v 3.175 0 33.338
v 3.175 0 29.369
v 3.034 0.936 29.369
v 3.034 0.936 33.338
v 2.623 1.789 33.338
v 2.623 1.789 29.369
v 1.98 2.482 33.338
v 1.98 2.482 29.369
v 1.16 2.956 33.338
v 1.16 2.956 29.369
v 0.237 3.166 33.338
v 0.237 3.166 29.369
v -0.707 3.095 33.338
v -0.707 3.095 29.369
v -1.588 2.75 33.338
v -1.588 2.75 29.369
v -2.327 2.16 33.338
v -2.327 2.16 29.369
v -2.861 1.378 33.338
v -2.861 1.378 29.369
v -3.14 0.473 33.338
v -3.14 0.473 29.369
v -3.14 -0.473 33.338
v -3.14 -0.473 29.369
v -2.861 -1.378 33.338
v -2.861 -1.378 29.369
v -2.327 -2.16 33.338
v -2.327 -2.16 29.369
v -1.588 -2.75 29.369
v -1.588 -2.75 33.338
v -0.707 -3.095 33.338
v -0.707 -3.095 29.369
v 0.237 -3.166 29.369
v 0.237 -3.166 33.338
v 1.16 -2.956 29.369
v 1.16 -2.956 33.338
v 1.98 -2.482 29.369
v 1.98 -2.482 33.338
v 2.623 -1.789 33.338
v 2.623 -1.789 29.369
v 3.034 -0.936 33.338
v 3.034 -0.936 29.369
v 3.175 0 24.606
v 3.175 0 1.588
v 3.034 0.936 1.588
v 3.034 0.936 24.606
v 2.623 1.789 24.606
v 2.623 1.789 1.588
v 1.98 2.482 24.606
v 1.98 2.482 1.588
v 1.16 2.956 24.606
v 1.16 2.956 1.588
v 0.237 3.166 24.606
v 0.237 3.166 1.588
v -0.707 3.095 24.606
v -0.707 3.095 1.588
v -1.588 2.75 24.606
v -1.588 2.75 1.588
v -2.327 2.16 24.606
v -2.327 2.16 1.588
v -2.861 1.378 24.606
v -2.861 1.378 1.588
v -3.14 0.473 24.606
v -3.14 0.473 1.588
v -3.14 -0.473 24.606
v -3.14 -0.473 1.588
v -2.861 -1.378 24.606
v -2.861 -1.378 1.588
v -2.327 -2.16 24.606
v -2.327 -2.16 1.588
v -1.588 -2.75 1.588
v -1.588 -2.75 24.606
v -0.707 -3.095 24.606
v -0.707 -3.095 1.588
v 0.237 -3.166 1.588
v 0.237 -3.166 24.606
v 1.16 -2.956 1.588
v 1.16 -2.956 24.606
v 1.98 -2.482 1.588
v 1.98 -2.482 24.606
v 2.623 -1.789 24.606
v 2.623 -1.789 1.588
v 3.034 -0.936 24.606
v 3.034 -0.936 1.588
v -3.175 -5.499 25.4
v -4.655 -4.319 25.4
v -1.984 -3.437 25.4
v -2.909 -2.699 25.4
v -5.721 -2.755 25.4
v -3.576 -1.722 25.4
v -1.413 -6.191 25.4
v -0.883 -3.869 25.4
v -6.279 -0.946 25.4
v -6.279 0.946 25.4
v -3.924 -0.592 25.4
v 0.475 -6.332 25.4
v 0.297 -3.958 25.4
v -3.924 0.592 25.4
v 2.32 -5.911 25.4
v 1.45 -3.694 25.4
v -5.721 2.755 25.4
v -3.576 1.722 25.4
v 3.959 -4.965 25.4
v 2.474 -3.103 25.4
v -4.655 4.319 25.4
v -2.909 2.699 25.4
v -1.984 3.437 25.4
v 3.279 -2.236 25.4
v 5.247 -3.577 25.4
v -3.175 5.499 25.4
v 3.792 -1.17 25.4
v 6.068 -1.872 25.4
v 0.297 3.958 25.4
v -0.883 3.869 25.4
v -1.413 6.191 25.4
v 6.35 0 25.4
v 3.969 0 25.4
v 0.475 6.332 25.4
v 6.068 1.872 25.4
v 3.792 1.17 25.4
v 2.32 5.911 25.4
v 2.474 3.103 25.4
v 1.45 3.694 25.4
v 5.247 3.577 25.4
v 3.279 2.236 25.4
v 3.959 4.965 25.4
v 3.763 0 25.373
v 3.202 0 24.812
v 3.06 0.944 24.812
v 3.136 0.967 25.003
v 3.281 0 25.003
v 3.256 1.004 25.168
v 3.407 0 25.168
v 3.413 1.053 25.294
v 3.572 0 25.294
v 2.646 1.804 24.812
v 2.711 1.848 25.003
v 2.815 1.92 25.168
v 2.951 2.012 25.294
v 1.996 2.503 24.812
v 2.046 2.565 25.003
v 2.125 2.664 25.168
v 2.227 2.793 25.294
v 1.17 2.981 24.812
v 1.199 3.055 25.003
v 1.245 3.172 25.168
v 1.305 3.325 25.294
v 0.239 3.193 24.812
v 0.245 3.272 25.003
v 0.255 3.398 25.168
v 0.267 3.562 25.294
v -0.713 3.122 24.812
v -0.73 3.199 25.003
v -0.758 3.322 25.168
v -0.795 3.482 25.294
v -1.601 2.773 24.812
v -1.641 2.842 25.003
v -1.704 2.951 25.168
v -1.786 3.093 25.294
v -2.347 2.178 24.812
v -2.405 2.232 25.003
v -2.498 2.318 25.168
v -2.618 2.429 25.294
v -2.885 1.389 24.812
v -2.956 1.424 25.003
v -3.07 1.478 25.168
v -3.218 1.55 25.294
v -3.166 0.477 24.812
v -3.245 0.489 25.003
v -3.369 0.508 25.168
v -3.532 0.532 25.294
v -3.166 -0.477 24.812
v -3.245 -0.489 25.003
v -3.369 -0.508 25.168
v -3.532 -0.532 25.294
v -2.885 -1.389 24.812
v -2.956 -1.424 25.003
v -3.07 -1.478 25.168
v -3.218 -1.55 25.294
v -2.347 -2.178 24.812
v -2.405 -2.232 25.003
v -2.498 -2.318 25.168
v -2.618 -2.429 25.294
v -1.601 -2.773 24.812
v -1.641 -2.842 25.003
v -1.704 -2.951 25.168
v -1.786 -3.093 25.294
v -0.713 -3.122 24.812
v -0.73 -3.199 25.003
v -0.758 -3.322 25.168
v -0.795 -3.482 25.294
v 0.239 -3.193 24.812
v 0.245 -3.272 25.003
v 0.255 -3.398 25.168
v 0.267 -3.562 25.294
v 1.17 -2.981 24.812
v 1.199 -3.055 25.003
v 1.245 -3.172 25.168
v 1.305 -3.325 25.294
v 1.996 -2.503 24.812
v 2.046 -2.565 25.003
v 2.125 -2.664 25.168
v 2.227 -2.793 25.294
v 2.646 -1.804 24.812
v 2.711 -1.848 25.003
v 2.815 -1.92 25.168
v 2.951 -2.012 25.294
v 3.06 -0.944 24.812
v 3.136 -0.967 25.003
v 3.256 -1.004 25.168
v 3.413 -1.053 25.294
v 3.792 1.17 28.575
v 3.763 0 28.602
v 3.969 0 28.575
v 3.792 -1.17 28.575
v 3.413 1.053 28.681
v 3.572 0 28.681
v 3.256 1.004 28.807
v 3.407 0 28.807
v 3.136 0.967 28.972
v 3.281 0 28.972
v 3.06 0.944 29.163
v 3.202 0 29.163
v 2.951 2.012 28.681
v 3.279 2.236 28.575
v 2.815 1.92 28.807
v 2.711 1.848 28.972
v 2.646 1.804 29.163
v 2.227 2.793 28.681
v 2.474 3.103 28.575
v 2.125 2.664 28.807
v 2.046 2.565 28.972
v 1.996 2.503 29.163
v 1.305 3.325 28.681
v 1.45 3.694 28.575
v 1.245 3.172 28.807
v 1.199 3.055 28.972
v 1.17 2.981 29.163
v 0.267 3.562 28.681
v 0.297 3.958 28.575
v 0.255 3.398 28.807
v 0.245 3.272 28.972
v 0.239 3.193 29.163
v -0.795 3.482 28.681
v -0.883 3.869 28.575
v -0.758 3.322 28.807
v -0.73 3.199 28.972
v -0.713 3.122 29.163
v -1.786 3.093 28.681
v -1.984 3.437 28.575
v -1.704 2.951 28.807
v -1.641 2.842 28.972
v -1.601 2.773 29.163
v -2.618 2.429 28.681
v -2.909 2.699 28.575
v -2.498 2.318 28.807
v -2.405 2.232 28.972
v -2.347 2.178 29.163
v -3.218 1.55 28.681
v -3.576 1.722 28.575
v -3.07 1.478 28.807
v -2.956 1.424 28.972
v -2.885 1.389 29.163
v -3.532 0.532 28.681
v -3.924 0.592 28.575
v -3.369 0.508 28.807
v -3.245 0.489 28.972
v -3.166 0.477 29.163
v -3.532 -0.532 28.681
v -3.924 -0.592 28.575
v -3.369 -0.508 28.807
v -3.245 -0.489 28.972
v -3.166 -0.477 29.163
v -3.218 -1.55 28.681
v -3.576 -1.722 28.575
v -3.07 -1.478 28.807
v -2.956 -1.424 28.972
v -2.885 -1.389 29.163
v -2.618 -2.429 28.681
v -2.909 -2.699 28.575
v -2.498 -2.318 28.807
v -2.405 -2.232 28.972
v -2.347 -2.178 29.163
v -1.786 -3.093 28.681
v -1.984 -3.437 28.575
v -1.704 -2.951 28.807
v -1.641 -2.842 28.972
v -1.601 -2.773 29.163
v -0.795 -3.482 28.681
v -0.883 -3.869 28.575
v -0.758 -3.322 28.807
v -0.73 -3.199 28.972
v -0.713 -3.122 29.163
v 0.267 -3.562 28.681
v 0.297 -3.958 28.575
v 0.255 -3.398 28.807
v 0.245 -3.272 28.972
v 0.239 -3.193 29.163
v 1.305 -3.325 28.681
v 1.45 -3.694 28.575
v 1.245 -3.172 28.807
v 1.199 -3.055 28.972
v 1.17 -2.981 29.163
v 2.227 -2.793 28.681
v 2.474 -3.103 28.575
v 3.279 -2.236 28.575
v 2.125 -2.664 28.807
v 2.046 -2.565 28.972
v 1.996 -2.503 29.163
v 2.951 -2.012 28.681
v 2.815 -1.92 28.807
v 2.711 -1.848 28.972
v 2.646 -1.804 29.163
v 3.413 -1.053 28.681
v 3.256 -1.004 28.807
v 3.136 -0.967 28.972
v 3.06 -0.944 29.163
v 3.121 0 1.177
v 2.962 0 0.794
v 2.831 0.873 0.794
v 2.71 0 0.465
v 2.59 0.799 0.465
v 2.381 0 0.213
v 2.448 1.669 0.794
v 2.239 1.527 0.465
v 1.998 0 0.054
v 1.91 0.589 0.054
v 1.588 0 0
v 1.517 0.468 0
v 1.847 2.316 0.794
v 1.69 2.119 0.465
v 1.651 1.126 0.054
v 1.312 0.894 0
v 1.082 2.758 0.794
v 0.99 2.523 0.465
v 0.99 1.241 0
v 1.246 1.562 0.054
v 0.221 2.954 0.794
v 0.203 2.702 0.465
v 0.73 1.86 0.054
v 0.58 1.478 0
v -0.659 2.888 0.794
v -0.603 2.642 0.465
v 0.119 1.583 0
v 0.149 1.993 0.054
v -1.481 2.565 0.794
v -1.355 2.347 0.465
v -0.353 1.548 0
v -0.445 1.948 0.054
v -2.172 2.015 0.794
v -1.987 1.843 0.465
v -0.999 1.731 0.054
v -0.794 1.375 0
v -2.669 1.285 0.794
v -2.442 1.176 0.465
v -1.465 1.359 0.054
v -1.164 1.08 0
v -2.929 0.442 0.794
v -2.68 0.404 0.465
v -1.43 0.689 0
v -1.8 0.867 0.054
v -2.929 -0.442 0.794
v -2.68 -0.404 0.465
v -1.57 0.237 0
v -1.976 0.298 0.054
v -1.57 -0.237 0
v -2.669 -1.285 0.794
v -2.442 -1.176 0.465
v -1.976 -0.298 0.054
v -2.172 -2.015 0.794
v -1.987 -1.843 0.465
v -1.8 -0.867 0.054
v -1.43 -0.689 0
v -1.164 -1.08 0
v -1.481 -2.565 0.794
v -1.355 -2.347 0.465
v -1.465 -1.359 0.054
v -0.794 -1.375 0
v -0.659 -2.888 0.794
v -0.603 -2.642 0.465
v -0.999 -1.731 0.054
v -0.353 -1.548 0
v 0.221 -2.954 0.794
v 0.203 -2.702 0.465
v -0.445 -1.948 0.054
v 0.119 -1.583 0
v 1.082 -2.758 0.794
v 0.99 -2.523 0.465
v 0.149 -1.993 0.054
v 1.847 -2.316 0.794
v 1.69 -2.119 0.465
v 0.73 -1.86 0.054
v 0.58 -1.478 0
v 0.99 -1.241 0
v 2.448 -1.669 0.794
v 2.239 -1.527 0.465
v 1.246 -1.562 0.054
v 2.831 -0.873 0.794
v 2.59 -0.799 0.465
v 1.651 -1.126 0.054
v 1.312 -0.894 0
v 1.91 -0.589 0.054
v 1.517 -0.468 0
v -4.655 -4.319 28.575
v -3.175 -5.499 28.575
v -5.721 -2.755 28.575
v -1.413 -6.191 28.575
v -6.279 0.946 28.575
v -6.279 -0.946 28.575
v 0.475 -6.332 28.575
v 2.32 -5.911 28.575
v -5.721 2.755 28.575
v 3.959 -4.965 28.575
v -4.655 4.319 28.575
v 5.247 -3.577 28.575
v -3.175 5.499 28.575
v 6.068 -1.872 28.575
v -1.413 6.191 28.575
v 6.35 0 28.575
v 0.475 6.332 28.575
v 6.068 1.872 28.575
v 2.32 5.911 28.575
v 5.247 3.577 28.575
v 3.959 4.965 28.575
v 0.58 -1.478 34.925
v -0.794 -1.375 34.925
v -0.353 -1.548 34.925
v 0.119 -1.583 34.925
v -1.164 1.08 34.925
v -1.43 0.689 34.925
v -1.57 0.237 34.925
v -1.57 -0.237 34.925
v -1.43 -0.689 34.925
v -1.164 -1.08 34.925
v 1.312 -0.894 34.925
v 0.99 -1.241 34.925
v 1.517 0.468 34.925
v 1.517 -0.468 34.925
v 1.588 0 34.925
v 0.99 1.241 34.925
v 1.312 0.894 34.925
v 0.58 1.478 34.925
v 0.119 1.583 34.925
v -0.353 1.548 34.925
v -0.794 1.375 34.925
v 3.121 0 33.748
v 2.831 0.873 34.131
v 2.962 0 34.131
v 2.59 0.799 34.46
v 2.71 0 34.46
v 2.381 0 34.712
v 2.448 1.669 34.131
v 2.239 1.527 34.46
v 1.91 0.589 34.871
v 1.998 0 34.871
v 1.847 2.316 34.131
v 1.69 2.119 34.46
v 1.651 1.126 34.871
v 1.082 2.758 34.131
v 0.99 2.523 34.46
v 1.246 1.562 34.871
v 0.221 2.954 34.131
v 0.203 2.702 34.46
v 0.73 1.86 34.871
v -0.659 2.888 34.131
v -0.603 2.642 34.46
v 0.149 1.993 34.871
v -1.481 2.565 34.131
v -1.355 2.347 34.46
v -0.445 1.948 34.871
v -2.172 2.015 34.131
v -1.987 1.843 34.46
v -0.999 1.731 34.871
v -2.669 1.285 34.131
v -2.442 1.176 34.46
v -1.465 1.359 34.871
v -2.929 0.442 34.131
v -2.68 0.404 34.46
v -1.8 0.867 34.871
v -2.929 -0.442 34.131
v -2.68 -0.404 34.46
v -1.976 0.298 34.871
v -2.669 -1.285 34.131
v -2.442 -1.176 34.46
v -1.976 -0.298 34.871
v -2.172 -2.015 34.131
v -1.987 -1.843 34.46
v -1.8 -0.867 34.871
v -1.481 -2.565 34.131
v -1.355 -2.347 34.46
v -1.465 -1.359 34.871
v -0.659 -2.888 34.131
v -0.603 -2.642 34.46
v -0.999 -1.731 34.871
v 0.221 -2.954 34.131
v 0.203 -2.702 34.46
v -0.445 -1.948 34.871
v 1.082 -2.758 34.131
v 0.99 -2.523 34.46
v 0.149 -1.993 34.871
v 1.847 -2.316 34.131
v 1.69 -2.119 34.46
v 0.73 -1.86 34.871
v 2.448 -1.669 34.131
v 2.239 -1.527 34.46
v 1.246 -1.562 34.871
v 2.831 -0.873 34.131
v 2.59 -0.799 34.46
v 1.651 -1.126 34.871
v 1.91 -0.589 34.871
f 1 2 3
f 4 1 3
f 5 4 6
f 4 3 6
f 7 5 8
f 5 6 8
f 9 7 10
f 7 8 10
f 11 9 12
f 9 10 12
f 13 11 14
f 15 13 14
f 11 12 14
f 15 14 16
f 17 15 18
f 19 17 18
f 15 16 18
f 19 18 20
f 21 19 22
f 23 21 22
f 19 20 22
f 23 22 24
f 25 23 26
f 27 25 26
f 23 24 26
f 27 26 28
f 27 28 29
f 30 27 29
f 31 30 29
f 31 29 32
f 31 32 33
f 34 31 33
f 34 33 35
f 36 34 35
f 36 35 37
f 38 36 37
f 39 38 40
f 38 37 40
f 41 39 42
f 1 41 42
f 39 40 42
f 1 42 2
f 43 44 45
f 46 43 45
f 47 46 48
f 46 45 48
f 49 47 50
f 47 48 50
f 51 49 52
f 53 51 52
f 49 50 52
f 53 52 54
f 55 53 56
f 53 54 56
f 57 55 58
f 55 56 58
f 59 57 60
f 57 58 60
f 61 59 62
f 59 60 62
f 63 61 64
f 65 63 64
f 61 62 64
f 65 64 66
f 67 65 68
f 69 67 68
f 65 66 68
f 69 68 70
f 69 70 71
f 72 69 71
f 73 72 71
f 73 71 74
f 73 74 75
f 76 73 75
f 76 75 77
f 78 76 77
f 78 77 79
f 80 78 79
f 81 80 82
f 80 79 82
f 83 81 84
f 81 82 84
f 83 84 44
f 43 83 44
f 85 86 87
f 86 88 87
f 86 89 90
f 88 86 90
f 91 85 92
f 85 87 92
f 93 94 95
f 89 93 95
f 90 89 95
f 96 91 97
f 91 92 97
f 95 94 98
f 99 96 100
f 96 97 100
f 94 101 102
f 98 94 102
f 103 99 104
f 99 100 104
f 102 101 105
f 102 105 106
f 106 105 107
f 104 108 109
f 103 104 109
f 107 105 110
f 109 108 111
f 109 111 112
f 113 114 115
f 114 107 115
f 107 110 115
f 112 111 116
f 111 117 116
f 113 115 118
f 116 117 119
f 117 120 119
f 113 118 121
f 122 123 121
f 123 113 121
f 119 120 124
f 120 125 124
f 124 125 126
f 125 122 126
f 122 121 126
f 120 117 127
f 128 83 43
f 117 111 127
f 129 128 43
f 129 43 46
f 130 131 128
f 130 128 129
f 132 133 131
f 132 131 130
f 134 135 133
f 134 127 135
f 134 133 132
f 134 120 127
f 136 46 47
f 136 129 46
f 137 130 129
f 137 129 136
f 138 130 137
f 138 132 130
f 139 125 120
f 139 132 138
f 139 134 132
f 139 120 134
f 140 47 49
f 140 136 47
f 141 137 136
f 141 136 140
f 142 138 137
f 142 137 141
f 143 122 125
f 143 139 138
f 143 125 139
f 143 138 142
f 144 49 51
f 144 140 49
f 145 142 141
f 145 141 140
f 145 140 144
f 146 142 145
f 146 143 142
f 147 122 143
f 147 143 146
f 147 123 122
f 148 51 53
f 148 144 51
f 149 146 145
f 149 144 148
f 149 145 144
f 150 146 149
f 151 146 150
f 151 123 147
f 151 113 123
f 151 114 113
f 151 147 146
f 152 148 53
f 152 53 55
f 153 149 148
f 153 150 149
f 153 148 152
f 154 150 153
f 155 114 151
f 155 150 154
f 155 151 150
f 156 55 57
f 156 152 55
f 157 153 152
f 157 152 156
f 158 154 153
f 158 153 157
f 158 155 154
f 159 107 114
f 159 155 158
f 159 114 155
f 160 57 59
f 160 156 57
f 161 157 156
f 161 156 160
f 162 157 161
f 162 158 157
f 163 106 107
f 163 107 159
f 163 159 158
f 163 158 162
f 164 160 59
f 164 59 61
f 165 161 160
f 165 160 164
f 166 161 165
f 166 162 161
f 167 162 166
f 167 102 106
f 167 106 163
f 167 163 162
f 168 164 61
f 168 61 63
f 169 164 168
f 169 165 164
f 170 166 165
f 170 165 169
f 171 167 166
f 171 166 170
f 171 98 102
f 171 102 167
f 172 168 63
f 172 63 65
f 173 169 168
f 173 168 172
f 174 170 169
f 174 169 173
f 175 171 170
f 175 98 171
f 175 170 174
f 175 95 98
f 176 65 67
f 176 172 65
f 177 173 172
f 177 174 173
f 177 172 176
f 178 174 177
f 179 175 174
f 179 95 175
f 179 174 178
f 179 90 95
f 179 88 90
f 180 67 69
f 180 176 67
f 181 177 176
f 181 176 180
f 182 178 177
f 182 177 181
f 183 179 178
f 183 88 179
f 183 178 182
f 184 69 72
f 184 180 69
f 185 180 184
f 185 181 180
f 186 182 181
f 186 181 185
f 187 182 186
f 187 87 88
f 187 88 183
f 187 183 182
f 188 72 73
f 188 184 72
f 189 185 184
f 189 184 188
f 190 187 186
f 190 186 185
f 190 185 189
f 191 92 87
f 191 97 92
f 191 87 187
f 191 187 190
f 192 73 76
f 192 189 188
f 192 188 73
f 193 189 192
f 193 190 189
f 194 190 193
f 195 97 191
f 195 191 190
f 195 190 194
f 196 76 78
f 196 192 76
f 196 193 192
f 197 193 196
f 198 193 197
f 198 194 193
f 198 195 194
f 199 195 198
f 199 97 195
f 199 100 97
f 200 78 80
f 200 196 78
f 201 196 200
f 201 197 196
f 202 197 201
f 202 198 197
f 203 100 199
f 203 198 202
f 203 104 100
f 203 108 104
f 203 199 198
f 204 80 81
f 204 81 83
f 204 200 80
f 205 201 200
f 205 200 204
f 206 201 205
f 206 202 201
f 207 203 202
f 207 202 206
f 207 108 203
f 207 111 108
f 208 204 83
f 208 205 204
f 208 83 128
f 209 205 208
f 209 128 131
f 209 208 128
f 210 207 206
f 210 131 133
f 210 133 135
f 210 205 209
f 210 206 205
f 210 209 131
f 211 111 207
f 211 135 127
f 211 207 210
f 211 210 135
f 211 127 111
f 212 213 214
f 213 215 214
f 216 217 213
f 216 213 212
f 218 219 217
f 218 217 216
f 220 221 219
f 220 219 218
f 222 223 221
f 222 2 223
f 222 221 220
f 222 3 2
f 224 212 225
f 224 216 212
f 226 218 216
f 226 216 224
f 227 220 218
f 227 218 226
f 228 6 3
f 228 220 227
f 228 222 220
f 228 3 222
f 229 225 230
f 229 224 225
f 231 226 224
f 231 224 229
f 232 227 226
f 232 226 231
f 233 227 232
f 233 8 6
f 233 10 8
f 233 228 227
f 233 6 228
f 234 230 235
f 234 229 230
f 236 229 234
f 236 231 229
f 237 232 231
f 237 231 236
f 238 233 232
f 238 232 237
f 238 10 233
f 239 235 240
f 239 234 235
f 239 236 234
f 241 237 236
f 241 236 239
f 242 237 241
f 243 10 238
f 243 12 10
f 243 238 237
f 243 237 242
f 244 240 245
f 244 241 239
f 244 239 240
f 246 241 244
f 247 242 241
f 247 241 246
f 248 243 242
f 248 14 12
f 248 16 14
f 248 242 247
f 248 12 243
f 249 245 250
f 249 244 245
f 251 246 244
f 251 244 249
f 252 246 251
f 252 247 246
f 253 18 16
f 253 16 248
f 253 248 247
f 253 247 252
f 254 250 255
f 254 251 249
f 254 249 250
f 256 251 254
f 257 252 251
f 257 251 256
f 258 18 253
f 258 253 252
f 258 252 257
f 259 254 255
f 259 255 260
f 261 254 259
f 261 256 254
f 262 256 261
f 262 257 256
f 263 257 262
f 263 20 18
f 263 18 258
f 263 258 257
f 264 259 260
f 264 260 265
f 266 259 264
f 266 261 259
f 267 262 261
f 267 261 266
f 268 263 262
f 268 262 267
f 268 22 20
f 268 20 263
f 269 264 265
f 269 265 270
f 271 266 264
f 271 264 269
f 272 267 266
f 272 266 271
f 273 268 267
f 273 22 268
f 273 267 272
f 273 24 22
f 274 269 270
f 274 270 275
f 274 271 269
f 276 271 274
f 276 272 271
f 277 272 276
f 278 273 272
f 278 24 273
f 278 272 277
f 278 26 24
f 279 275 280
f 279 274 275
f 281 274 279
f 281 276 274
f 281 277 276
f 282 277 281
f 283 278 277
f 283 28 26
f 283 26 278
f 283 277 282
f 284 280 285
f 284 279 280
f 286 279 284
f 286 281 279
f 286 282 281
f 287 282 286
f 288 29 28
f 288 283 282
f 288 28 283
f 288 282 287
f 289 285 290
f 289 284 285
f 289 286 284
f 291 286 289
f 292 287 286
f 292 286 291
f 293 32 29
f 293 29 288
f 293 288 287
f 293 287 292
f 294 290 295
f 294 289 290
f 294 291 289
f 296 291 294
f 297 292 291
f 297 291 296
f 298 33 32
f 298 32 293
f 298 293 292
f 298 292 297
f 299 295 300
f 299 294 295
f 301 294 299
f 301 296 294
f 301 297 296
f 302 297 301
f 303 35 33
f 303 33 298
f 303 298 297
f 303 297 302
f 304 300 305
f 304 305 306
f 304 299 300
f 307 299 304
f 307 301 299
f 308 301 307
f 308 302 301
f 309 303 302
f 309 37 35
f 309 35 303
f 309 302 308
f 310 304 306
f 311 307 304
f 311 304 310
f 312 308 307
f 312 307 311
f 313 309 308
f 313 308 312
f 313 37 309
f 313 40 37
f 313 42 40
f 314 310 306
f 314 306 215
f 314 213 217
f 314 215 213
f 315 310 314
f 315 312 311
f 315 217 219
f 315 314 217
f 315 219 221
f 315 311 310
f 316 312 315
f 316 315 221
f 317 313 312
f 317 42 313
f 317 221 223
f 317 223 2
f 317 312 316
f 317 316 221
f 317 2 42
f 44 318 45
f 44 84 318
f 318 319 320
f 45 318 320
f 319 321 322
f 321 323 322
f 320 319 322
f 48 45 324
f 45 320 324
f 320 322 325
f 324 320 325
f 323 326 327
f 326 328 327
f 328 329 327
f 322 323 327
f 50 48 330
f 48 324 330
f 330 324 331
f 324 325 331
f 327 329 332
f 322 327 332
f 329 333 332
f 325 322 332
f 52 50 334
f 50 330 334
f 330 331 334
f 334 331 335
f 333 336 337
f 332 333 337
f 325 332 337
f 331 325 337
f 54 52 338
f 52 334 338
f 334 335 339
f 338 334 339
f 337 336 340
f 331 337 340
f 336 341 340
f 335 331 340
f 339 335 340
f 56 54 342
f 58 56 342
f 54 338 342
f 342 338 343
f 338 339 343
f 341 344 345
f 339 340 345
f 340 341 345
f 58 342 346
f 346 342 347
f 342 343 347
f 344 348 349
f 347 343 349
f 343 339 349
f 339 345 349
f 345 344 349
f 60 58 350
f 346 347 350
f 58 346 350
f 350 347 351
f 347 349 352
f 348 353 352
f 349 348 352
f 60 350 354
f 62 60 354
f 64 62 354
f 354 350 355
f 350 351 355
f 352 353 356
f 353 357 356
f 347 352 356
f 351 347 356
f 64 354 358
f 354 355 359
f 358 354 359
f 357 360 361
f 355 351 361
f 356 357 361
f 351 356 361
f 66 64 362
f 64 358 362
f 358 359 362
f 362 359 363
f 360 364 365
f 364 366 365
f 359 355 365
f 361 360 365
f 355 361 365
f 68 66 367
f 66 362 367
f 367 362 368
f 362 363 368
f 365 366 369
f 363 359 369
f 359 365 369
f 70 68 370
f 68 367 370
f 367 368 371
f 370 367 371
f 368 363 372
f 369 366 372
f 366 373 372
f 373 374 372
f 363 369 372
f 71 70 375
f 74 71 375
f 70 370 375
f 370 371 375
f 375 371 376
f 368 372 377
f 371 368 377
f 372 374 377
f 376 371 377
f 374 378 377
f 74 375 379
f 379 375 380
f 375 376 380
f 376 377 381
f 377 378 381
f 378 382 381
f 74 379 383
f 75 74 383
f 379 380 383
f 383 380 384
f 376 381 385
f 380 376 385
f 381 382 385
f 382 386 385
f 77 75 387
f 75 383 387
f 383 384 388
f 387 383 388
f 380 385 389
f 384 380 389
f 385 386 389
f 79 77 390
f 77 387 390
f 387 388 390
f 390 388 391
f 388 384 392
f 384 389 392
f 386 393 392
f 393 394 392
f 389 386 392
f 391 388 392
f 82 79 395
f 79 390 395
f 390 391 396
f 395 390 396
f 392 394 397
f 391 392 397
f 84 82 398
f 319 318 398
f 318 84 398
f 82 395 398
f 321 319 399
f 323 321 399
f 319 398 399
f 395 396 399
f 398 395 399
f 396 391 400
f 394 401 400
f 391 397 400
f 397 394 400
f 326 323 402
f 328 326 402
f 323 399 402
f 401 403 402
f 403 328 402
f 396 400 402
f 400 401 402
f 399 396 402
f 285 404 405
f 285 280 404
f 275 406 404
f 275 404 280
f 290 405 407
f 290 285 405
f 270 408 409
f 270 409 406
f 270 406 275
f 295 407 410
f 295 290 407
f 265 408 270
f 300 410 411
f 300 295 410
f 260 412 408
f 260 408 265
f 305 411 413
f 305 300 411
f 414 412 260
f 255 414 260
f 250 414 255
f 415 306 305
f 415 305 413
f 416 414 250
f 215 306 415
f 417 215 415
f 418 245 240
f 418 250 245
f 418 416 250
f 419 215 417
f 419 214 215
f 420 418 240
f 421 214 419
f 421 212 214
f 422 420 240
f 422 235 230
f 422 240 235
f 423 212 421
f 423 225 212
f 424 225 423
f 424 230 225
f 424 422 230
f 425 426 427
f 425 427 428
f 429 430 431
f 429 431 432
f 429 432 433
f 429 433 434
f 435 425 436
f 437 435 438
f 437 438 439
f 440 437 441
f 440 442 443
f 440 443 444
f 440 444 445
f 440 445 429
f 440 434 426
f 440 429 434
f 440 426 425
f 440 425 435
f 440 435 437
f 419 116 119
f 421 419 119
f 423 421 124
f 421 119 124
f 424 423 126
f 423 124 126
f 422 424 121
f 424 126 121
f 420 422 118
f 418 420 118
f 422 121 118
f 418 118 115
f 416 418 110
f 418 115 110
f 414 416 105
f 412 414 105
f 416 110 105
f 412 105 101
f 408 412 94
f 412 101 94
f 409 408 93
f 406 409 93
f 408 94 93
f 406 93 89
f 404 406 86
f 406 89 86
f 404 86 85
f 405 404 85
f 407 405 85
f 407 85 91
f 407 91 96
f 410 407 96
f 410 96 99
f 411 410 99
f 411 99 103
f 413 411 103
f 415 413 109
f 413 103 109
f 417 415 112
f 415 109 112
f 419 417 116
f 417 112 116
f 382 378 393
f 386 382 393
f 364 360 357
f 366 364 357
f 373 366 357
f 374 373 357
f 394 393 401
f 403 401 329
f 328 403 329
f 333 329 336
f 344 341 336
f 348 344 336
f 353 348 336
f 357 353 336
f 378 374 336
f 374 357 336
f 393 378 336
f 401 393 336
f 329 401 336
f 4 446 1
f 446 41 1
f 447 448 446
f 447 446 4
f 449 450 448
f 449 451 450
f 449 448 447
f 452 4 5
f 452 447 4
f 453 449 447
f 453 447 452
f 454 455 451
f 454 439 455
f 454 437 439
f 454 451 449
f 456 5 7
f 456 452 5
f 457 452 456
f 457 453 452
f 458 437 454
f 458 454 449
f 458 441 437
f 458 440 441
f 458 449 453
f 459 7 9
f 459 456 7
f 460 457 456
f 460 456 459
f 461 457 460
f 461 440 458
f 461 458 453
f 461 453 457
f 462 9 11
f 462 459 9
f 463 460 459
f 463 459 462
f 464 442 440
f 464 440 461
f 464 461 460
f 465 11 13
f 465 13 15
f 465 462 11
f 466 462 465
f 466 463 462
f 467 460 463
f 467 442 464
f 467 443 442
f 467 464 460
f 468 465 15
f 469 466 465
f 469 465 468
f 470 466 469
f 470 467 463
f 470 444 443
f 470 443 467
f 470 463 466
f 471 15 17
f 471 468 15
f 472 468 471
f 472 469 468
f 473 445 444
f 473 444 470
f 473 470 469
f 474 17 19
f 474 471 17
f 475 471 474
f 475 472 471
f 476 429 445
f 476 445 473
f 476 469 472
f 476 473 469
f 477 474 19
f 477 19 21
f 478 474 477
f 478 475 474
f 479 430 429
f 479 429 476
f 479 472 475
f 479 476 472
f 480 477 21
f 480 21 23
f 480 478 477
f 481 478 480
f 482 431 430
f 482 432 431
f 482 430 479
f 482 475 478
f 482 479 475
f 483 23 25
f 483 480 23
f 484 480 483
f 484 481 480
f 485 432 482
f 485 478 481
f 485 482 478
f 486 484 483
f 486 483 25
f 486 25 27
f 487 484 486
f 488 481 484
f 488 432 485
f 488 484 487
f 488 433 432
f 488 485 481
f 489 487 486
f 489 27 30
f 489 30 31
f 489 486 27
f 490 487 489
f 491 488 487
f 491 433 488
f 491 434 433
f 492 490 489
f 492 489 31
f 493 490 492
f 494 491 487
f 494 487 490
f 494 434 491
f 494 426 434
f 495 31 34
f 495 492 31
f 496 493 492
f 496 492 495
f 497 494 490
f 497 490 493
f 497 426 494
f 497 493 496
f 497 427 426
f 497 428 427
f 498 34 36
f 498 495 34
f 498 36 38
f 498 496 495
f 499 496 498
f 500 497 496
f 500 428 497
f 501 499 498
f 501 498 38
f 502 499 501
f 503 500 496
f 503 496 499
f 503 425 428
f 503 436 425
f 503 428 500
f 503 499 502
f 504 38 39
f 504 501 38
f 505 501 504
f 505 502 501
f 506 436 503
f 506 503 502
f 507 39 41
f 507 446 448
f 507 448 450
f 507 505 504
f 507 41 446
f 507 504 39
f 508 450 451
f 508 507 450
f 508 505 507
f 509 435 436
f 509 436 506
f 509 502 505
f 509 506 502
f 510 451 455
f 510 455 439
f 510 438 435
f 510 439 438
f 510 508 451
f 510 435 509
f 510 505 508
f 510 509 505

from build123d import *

# Parameters (mm, degrees)
SKETCH1_R           = 3.175
BOSS_EXTRUDE1_DEPTH = 25.4
SKETCH2_R           = 6.35
BOSS_EXTRUDE2_DEPTH = 3.175
SKETCH3_R           = 3.175
BOSS_EXTRUDE3_DEPTH = 6.35
FILLET1_R           = 1.5875
FILLET2_R           = 0.79375


with BuildPart() as part:
    # Sketch1 → Boss-Extrude1 (new body)
    with BuildSketch(Plane.XY):
        Circle(SKETCH1_R)
    extrude(amount=BOSS_EXTRUDE1_DEPTH)

    # Sketch2 → Boss-Extrude2 (add)
    with BuildSketch(Plane.XY.offset(25.4)):
        Circle(SKETCH2_R)
    extrude(amount=BOSS_EXTRUDE2_DEPTH)

    # Sketch3 → Boss-Extrude3 (add)
    with BuildSketch(Plane.XY.offset(28.575)):
        Circle(SKETCH3_R)
    extrude(amount=BOSS_EXTRUDE3_DEPTH)

    # Fillet1
    fillet1_edges = [part.edges().sort_by_distance(p)[0] for p in [
        (-3.175, 0, 34.925),
        (-3.175, 0, 0),
    ]]
    fillet(fillet1_edges, radius=FILLET1_R)

    # Fillet2
    fillet2_edges = [part.edges().sort_by_distance(p)[0] for p in [
        (-3.175, 0, 28.575),
        (-3.175, 0, 25.4),
    ]]
    fillet(fillet2_edges, radius=FILLET2_R)


solid = part.part
